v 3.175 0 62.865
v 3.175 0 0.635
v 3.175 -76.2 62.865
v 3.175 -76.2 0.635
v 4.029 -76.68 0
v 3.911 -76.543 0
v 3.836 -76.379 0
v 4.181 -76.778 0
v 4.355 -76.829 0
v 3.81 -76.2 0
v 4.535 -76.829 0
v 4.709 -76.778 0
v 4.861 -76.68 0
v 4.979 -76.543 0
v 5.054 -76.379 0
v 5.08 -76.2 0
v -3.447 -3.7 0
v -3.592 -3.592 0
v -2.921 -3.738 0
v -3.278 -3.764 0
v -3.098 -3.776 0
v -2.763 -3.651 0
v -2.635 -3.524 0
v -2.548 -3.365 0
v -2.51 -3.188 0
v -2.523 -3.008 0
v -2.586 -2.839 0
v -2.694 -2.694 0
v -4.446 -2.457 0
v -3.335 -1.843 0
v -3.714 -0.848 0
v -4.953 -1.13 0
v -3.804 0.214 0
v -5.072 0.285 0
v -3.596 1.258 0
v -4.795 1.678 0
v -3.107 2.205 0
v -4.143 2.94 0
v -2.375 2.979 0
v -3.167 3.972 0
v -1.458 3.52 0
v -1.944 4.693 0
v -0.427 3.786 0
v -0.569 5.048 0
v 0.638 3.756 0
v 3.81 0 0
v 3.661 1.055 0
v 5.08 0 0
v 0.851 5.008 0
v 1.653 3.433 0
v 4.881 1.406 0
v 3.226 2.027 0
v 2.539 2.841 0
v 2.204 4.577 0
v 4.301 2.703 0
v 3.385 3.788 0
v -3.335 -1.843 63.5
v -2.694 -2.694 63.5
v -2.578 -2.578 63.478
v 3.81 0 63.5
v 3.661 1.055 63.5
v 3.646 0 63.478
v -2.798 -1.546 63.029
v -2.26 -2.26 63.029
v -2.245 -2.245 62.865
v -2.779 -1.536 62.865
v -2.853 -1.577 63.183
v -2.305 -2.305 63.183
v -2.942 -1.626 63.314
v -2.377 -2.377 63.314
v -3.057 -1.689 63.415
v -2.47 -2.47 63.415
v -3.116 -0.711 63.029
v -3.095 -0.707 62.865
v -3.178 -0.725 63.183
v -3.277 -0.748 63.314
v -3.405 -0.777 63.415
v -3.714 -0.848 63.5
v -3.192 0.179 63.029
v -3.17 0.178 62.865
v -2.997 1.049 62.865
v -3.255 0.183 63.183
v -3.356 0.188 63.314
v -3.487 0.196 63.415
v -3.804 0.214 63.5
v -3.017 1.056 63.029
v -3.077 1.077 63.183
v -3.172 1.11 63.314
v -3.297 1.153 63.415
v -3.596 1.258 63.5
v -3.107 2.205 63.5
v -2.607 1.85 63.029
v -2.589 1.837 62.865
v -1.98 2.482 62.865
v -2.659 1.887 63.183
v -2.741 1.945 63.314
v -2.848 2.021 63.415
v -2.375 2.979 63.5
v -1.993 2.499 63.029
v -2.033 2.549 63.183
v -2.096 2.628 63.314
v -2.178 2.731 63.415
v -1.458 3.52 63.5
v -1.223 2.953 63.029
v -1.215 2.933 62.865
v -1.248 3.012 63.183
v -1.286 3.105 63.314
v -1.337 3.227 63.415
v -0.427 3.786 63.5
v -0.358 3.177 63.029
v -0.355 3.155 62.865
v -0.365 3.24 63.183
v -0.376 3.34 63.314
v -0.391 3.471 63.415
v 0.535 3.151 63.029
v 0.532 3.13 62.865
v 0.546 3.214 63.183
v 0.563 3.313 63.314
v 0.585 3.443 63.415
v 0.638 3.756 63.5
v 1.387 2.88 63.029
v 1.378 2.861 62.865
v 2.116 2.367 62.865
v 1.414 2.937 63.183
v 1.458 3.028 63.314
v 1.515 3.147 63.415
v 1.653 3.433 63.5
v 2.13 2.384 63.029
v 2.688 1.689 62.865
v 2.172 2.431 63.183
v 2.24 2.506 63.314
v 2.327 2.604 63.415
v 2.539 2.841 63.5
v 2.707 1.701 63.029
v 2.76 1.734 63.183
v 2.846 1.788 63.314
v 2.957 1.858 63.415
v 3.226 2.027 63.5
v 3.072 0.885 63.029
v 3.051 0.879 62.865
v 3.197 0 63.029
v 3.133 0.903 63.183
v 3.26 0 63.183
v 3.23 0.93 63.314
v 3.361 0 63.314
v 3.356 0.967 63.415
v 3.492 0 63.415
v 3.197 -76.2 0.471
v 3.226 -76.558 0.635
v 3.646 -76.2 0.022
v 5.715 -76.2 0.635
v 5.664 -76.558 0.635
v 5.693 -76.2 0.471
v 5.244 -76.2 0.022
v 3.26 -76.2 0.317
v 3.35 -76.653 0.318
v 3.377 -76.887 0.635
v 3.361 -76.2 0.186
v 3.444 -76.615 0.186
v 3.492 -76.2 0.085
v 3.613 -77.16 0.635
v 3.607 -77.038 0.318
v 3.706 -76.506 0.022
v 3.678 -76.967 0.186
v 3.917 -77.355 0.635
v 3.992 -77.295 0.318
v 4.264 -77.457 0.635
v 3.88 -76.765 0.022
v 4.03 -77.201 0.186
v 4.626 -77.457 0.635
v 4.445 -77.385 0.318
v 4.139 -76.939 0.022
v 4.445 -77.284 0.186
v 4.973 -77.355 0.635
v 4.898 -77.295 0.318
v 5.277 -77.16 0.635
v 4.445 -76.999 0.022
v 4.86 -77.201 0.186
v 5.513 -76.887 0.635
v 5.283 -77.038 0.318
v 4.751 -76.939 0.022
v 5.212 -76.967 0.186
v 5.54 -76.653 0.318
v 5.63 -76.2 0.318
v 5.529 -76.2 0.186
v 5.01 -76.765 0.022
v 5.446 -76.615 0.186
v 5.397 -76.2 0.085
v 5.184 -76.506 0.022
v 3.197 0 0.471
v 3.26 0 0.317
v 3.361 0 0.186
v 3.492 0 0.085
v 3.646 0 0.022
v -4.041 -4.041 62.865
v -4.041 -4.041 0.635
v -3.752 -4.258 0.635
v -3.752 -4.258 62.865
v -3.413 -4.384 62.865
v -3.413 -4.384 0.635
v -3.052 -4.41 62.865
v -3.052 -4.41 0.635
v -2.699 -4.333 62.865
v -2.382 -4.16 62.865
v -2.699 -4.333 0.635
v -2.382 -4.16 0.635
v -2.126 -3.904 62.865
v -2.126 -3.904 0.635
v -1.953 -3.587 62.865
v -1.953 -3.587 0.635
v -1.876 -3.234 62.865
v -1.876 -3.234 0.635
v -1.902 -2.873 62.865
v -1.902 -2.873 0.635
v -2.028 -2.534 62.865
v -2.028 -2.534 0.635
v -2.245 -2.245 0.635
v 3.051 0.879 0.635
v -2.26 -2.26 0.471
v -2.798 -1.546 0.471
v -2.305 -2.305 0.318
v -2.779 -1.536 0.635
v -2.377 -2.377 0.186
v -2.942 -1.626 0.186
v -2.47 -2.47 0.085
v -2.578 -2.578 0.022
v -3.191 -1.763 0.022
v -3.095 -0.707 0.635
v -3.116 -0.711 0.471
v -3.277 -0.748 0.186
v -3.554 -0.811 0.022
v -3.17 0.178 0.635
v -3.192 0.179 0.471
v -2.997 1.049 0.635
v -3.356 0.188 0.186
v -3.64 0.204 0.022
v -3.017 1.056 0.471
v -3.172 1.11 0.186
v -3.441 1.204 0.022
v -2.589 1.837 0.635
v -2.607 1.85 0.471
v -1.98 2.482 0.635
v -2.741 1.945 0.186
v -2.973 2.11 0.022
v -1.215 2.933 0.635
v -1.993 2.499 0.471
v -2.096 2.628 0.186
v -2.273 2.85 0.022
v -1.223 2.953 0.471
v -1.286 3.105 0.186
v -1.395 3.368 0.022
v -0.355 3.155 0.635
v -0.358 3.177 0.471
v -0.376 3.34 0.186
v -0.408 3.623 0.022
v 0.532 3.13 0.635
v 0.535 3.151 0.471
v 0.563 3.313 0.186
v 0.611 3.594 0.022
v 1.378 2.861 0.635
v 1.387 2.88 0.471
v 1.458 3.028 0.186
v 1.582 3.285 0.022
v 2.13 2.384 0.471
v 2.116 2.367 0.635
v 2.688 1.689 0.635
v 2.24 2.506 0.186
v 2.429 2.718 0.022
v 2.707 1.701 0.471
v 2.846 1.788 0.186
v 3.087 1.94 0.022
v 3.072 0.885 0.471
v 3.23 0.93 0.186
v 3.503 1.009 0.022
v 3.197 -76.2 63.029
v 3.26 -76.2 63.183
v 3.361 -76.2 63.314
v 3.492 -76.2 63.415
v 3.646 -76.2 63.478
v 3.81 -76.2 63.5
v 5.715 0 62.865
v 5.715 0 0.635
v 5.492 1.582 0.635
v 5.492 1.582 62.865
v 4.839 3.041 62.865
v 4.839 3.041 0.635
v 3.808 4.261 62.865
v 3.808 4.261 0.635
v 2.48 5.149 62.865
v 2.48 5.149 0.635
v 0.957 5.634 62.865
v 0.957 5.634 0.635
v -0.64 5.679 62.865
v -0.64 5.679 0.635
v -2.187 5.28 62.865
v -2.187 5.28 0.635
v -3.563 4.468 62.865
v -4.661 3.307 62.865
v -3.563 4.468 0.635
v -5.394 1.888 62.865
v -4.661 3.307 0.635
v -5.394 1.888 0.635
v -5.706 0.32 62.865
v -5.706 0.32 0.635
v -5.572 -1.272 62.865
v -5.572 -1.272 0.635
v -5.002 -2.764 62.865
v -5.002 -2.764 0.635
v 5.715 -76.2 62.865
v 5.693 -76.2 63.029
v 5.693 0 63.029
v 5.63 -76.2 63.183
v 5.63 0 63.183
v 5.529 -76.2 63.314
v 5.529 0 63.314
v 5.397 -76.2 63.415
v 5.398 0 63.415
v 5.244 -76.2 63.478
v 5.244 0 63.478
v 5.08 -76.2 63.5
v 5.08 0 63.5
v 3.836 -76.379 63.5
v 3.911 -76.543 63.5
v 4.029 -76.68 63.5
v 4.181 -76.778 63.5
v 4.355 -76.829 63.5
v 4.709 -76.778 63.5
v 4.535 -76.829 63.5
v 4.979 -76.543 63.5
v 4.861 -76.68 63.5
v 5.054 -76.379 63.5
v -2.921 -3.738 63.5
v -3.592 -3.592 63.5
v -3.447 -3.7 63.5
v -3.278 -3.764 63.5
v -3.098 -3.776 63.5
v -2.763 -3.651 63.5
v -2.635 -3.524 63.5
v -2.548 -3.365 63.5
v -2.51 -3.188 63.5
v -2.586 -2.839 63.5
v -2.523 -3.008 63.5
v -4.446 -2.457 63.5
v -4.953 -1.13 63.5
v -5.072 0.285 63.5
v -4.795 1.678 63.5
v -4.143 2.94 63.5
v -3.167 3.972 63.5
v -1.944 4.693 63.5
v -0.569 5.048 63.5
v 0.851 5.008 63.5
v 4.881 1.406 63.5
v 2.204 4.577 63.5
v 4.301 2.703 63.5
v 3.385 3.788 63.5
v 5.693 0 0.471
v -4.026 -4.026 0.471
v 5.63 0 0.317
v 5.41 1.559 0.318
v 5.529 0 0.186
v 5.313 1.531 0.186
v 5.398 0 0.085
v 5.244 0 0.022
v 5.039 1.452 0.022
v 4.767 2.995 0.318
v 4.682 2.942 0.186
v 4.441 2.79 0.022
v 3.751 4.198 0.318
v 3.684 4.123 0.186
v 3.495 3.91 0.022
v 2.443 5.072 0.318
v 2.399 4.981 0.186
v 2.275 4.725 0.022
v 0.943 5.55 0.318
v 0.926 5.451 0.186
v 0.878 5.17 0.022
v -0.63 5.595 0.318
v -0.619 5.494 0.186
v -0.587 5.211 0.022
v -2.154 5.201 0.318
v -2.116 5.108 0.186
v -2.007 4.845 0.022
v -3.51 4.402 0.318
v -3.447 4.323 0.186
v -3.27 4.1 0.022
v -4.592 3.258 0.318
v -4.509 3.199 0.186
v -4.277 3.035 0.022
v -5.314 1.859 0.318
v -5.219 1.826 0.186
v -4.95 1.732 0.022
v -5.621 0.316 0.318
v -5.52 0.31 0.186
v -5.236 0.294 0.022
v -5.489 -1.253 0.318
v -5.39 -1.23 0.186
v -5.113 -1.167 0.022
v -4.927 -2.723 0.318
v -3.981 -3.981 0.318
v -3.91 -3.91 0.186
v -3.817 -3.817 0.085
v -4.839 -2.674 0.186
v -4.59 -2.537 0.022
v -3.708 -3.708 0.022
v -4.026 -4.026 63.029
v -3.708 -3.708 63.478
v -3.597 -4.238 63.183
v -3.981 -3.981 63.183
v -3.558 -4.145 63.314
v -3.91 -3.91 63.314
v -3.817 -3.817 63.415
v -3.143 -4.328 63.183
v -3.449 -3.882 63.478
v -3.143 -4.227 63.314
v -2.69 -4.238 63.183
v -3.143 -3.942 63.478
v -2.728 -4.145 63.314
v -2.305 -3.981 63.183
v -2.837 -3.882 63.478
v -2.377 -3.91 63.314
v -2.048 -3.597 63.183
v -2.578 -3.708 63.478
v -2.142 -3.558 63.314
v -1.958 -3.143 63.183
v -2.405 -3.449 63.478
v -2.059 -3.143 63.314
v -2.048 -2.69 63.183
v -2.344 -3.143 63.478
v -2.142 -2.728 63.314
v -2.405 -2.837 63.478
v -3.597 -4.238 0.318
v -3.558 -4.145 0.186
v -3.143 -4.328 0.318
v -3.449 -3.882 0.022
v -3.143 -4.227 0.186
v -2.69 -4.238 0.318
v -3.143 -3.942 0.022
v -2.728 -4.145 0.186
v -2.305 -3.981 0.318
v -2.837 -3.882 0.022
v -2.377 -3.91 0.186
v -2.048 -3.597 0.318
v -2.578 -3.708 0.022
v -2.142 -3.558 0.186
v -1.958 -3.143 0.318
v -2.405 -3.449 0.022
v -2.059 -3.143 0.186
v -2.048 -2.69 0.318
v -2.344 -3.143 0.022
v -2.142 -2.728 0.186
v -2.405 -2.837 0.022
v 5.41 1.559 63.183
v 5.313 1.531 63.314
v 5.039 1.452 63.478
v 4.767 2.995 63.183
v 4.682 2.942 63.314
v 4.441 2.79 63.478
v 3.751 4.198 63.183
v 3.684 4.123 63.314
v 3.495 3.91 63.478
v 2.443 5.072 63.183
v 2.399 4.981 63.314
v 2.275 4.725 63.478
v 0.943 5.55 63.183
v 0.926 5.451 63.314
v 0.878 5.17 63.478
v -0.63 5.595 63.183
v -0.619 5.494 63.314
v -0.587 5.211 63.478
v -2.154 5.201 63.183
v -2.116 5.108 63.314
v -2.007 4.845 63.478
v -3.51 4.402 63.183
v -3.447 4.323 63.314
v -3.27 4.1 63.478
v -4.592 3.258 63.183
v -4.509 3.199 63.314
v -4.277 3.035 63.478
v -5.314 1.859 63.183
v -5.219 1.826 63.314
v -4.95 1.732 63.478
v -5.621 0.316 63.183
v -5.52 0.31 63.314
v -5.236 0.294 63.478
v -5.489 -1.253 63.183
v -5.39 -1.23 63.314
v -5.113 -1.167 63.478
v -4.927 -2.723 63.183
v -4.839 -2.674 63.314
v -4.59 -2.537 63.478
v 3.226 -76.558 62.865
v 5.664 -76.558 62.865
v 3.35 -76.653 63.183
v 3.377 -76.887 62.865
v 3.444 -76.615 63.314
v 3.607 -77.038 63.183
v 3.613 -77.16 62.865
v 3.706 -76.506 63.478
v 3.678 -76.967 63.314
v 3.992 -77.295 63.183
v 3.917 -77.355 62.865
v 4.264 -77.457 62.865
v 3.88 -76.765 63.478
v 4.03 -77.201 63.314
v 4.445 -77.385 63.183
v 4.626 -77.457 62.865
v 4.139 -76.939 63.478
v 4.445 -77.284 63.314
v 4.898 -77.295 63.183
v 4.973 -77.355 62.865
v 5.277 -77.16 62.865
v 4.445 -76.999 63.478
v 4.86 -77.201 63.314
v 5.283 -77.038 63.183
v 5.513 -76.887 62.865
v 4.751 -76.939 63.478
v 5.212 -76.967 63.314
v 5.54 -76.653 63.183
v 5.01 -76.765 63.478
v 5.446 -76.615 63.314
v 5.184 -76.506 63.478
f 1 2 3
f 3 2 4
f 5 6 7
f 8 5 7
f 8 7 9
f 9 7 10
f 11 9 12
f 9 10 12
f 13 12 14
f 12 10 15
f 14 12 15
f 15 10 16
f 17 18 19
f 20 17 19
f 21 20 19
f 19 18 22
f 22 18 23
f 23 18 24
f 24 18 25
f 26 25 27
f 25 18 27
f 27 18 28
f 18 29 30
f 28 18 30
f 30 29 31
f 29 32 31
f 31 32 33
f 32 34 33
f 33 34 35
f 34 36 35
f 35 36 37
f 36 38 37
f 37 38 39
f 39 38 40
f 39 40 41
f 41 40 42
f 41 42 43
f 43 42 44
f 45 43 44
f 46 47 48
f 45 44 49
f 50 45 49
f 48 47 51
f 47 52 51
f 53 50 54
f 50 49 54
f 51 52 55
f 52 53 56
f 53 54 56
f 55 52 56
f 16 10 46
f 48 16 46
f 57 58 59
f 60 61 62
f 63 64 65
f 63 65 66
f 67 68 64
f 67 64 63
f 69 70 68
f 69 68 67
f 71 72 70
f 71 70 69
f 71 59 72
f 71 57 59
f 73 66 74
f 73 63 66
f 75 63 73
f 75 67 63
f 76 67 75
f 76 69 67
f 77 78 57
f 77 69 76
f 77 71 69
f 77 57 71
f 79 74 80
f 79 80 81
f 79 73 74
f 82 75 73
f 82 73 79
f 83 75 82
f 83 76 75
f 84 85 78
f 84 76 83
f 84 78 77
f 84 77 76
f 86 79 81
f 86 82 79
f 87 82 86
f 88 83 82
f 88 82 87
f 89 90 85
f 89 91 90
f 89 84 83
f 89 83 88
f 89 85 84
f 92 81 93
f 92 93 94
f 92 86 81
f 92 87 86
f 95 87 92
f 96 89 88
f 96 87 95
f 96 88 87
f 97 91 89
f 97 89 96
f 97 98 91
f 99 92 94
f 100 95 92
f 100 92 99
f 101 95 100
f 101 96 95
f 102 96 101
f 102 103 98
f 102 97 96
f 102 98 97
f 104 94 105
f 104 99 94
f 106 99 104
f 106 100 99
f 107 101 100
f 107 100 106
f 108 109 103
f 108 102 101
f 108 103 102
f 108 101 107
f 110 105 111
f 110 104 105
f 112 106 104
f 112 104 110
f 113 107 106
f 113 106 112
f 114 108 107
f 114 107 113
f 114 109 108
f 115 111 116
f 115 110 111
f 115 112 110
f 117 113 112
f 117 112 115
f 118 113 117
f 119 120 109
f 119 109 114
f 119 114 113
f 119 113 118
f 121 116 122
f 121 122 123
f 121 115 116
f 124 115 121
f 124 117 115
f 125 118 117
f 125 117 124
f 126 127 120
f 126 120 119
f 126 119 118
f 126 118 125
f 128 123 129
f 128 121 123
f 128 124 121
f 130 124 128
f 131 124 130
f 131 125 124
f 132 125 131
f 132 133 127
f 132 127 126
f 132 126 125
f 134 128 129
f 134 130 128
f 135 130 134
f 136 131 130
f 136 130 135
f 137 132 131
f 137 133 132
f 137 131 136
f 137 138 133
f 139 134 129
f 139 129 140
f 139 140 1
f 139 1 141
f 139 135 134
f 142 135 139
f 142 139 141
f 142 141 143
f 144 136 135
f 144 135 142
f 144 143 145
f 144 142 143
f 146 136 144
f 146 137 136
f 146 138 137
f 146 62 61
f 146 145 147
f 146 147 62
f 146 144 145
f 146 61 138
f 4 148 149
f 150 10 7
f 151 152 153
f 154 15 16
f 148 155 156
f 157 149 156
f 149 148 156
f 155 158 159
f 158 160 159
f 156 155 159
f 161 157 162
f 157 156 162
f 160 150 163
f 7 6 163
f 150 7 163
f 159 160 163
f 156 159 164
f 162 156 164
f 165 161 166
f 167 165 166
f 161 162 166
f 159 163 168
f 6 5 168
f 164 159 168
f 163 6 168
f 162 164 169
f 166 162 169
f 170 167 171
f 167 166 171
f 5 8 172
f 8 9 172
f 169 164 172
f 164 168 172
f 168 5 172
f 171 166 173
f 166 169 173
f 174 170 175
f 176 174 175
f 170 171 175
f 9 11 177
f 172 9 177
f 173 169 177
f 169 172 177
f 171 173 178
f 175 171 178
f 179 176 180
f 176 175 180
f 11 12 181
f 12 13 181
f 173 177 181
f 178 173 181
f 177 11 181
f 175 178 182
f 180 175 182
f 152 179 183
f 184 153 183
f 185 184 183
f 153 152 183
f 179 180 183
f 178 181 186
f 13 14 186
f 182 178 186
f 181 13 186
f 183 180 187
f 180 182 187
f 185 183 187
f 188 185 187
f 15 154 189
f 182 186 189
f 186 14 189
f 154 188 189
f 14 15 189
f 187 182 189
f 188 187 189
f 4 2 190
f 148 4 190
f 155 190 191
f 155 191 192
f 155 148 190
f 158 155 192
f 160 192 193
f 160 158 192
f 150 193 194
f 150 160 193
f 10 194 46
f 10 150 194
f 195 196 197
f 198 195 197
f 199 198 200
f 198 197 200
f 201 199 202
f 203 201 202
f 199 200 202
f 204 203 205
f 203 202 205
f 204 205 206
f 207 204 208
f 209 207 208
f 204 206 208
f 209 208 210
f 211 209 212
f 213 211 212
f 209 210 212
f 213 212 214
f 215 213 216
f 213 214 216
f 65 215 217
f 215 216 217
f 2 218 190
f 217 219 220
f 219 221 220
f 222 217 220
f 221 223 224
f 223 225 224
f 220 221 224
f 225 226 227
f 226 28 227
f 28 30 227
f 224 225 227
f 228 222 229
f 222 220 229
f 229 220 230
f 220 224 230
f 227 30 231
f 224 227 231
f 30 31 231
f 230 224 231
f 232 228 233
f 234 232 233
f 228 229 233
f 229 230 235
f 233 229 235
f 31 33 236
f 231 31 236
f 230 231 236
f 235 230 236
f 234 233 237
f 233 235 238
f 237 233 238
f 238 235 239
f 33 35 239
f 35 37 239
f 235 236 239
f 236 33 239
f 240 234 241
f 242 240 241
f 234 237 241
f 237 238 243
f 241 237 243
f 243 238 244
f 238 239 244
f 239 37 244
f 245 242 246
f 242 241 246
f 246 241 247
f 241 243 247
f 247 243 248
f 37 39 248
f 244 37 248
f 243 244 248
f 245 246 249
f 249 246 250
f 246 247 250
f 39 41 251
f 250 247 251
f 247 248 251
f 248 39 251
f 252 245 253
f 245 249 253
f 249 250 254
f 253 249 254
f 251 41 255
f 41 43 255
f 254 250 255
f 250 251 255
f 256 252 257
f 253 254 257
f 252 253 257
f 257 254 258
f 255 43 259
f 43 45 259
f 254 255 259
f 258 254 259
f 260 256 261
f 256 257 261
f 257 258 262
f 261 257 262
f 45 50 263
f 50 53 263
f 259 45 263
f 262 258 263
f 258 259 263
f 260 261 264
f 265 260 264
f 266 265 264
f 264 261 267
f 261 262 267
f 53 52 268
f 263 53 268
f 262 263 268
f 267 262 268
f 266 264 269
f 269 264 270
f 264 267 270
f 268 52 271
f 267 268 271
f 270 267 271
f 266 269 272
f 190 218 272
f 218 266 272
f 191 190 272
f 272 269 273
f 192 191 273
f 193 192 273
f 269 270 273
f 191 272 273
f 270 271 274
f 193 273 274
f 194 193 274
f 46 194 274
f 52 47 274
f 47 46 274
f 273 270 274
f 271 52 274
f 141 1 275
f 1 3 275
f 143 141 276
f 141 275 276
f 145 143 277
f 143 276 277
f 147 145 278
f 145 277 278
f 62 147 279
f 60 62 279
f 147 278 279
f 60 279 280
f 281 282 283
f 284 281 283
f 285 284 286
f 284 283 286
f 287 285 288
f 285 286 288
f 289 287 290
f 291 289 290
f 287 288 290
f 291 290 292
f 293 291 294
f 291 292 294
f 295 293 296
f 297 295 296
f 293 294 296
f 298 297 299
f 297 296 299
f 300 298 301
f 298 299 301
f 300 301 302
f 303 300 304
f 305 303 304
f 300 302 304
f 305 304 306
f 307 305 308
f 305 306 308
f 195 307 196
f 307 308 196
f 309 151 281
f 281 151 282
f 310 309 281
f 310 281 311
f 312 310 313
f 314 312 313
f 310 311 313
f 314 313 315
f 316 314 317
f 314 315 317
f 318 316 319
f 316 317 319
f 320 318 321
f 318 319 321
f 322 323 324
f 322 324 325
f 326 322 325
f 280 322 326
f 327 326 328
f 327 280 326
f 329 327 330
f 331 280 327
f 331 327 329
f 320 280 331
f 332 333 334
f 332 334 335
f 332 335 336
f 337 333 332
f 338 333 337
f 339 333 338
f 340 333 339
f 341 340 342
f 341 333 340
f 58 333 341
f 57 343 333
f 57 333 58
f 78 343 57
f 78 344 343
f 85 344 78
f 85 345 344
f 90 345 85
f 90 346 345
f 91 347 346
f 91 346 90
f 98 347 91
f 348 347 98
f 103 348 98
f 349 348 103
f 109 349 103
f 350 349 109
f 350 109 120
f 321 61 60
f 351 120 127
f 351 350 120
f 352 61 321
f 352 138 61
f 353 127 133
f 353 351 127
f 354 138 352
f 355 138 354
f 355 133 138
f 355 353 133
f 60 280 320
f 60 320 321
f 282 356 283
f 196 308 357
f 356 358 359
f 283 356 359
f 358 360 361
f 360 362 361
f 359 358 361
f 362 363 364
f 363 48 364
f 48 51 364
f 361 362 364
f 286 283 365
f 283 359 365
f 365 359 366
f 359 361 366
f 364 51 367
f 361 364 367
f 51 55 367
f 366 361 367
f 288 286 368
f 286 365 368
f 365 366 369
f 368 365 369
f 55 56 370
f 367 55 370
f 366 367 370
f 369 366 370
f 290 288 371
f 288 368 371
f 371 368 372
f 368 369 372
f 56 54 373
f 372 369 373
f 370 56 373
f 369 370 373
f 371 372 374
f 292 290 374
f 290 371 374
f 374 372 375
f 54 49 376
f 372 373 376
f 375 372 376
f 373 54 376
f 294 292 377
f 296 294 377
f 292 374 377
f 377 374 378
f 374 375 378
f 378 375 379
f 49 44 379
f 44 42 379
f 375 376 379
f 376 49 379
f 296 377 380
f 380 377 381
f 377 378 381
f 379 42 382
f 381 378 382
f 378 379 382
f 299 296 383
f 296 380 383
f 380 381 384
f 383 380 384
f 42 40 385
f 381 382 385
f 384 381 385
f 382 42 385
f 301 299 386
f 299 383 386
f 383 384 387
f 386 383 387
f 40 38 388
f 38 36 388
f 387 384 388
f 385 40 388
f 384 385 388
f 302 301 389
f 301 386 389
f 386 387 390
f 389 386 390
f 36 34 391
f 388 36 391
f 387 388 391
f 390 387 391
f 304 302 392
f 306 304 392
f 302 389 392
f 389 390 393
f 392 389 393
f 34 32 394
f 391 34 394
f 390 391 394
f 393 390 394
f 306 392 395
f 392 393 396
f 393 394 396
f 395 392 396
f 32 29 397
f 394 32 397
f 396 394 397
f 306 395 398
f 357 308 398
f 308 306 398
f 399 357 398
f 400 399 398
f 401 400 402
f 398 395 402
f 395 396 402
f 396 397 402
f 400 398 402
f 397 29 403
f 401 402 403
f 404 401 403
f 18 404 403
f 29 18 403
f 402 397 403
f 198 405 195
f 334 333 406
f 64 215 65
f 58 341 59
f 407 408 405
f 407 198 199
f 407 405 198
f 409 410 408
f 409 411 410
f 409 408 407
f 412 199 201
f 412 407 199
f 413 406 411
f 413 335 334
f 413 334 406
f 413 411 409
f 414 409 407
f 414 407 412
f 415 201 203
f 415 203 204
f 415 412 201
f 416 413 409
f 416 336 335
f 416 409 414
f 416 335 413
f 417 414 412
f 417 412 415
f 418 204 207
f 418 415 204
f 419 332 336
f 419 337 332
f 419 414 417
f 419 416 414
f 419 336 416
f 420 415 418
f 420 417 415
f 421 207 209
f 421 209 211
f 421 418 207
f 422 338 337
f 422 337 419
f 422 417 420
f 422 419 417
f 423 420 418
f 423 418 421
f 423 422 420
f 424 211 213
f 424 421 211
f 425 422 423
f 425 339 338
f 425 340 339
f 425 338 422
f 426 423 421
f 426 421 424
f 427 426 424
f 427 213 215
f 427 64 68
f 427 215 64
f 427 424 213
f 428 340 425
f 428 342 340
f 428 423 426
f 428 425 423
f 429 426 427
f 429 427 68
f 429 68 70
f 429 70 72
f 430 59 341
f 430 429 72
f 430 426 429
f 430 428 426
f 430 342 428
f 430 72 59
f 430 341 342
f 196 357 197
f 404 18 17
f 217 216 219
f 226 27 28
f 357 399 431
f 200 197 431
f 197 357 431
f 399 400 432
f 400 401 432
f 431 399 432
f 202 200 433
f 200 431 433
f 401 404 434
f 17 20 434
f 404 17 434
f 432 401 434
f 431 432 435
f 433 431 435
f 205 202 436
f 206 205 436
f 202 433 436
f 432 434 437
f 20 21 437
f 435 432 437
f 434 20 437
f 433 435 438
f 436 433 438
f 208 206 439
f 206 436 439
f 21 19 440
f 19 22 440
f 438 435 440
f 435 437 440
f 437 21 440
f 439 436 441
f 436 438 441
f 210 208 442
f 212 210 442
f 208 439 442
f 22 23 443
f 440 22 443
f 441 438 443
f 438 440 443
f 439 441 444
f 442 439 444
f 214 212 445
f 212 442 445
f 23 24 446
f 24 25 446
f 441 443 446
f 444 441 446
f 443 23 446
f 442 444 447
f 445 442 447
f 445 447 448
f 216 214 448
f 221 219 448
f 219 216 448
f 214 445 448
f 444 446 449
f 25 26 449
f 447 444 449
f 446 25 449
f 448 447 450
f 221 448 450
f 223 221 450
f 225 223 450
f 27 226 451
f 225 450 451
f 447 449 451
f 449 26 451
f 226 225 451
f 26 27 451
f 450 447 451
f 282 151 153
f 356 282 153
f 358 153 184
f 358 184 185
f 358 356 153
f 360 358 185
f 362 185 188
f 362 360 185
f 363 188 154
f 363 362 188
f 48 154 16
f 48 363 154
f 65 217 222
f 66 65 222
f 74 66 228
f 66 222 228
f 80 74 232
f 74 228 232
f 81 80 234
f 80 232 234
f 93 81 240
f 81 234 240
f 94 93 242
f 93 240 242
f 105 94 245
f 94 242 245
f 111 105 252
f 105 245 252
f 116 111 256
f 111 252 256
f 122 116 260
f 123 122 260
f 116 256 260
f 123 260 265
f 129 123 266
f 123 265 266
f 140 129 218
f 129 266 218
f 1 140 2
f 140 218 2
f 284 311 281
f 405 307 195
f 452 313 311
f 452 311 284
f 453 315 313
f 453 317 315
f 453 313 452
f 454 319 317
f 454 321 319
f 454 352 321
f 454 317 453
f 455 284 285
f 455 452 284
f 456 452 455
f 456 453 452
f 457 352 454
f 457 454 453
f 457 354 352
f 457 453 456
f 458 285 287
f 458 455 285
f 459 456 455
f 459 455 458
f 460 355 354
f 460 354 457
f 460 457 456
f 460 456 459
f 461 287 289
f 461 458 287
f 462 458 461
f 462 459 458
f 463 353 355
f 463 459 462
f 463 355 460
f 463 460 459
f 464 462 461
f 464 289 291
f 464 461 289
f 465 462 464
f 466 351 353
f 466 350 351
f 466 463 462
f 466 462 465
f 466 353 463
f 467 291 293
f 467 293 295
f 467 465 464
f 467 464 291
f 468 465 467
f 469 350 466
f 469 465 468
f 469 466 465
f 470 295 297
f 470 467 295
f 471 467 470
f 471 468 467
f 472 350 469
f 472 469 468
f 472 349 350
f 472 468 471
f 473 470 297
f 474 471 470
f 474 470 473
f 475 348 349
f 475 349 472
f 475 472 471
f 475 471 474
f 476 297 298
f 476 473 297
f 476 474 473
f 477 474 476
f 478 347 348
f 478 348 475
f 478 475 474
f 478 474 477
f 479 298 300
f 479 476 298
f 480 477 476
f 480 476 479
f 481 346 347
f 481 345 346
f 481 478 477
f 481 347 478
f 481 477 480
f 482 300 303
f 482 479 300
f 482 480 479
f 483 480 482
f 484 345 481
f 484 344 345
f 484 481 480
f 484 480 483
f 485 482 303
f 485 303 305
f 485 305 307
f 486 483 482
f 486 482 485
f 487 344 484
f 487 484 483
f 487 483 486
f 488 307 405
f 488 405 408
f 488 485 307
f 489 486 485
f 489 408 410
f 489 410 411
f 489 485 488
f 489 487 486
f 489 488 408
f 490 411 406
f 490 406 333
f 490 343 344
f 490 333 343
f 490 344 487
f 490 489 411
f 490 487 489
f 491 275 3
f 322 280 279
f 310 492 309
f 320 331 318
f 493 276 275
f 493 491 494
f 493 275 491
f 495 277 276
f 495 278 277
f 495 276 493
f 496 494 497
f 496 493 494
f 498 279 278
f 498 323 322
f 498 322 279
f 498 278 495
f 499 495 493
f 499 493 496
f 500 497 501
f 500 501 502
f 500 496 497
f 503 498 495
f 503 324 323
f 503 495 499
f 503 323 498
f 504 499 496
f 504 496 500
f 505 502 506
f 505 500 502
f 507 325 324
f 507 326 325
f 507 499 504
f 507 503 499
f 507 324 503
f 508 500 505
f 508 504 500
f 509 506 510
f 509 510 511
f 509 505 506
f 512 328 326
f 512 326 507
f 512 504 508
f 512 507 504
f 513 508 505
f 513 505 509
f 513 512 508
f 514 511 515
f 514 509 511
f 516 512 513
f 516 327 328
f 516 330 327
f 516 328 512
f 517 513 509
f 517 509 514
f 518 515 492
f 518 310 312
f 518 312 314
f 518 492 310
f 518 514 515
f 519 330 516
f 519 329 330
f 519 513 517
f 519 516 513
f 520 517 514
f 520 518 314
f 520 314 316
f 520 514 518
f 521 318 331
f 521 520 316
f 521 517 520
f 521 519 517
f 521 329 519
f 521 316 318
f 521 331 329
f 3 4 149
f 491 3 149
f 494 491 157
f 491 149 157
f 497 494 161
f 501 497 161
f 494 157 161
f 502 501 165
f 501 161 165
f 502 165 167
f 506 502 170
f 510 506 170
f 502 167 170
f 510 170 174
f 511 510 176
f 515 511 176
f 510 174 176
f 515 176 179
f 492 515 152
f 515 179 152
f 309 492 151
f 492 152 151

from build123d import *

# Parameters (mm, degrees)
BOSS_EXTRUDE1_DEPTH = 63.5
FILLET1_R           = 0.635


with BuildPart() as part:
    # Sketch1 → Boss-Extrude1 (new body)
    with BuildSketch(Plane.XY):
        with BuildLine():
            Line((3.175, 0), (3.175, -76.2))
            ThreePointArc((3.175, -76.2), (4.445, -77.47), (5.715, -76.2))
            Line((5.715, -76.2), (5.715, 0))
            ThreePointArc((5.715, 0), (-2.187035816, 5.279971528), (-4.041115254, -4.041115254))
            ThreePointArc((-4.041115254, -4.041115254), (-2.24506403, -4.041115254), (-2.24506403, -2.24506403))
            ThreePointArc((-2.24506403, -2.24506403), (-1.215019898, 2.933317516), (3.175, 0))
        make_face()
    extrude(amount=BOSS_EXTRUDE1_DEPTH)

    # Fillet1
    fillet1_edges = [part.edges().sort_by_distance(p)[0] for p in [
        (-2.187035816, 5.279971528, 63.5),
        (-2.24506403, -4.041115254, 63.5),
        (-1.215019898, 2.933317516, 63.5),
        (3.175, -38.1, 63.5),
        (4.445, -77.47, 63.5),
        (3.175, -38.1, 0),
        (-1.215019898, 2.933317516, 0),
        (-2.24506403, -4.041115254, 0),
        (5.715, -38.1, 63.5),
        (-2.187035816, 5.279971528, 0),
        (5.715, -38.1, 0),
        (4.445, -77.47, 0),
    ]]
    fillet(fillet1_edges, radius=FILLET1_R)


solid = part.part
